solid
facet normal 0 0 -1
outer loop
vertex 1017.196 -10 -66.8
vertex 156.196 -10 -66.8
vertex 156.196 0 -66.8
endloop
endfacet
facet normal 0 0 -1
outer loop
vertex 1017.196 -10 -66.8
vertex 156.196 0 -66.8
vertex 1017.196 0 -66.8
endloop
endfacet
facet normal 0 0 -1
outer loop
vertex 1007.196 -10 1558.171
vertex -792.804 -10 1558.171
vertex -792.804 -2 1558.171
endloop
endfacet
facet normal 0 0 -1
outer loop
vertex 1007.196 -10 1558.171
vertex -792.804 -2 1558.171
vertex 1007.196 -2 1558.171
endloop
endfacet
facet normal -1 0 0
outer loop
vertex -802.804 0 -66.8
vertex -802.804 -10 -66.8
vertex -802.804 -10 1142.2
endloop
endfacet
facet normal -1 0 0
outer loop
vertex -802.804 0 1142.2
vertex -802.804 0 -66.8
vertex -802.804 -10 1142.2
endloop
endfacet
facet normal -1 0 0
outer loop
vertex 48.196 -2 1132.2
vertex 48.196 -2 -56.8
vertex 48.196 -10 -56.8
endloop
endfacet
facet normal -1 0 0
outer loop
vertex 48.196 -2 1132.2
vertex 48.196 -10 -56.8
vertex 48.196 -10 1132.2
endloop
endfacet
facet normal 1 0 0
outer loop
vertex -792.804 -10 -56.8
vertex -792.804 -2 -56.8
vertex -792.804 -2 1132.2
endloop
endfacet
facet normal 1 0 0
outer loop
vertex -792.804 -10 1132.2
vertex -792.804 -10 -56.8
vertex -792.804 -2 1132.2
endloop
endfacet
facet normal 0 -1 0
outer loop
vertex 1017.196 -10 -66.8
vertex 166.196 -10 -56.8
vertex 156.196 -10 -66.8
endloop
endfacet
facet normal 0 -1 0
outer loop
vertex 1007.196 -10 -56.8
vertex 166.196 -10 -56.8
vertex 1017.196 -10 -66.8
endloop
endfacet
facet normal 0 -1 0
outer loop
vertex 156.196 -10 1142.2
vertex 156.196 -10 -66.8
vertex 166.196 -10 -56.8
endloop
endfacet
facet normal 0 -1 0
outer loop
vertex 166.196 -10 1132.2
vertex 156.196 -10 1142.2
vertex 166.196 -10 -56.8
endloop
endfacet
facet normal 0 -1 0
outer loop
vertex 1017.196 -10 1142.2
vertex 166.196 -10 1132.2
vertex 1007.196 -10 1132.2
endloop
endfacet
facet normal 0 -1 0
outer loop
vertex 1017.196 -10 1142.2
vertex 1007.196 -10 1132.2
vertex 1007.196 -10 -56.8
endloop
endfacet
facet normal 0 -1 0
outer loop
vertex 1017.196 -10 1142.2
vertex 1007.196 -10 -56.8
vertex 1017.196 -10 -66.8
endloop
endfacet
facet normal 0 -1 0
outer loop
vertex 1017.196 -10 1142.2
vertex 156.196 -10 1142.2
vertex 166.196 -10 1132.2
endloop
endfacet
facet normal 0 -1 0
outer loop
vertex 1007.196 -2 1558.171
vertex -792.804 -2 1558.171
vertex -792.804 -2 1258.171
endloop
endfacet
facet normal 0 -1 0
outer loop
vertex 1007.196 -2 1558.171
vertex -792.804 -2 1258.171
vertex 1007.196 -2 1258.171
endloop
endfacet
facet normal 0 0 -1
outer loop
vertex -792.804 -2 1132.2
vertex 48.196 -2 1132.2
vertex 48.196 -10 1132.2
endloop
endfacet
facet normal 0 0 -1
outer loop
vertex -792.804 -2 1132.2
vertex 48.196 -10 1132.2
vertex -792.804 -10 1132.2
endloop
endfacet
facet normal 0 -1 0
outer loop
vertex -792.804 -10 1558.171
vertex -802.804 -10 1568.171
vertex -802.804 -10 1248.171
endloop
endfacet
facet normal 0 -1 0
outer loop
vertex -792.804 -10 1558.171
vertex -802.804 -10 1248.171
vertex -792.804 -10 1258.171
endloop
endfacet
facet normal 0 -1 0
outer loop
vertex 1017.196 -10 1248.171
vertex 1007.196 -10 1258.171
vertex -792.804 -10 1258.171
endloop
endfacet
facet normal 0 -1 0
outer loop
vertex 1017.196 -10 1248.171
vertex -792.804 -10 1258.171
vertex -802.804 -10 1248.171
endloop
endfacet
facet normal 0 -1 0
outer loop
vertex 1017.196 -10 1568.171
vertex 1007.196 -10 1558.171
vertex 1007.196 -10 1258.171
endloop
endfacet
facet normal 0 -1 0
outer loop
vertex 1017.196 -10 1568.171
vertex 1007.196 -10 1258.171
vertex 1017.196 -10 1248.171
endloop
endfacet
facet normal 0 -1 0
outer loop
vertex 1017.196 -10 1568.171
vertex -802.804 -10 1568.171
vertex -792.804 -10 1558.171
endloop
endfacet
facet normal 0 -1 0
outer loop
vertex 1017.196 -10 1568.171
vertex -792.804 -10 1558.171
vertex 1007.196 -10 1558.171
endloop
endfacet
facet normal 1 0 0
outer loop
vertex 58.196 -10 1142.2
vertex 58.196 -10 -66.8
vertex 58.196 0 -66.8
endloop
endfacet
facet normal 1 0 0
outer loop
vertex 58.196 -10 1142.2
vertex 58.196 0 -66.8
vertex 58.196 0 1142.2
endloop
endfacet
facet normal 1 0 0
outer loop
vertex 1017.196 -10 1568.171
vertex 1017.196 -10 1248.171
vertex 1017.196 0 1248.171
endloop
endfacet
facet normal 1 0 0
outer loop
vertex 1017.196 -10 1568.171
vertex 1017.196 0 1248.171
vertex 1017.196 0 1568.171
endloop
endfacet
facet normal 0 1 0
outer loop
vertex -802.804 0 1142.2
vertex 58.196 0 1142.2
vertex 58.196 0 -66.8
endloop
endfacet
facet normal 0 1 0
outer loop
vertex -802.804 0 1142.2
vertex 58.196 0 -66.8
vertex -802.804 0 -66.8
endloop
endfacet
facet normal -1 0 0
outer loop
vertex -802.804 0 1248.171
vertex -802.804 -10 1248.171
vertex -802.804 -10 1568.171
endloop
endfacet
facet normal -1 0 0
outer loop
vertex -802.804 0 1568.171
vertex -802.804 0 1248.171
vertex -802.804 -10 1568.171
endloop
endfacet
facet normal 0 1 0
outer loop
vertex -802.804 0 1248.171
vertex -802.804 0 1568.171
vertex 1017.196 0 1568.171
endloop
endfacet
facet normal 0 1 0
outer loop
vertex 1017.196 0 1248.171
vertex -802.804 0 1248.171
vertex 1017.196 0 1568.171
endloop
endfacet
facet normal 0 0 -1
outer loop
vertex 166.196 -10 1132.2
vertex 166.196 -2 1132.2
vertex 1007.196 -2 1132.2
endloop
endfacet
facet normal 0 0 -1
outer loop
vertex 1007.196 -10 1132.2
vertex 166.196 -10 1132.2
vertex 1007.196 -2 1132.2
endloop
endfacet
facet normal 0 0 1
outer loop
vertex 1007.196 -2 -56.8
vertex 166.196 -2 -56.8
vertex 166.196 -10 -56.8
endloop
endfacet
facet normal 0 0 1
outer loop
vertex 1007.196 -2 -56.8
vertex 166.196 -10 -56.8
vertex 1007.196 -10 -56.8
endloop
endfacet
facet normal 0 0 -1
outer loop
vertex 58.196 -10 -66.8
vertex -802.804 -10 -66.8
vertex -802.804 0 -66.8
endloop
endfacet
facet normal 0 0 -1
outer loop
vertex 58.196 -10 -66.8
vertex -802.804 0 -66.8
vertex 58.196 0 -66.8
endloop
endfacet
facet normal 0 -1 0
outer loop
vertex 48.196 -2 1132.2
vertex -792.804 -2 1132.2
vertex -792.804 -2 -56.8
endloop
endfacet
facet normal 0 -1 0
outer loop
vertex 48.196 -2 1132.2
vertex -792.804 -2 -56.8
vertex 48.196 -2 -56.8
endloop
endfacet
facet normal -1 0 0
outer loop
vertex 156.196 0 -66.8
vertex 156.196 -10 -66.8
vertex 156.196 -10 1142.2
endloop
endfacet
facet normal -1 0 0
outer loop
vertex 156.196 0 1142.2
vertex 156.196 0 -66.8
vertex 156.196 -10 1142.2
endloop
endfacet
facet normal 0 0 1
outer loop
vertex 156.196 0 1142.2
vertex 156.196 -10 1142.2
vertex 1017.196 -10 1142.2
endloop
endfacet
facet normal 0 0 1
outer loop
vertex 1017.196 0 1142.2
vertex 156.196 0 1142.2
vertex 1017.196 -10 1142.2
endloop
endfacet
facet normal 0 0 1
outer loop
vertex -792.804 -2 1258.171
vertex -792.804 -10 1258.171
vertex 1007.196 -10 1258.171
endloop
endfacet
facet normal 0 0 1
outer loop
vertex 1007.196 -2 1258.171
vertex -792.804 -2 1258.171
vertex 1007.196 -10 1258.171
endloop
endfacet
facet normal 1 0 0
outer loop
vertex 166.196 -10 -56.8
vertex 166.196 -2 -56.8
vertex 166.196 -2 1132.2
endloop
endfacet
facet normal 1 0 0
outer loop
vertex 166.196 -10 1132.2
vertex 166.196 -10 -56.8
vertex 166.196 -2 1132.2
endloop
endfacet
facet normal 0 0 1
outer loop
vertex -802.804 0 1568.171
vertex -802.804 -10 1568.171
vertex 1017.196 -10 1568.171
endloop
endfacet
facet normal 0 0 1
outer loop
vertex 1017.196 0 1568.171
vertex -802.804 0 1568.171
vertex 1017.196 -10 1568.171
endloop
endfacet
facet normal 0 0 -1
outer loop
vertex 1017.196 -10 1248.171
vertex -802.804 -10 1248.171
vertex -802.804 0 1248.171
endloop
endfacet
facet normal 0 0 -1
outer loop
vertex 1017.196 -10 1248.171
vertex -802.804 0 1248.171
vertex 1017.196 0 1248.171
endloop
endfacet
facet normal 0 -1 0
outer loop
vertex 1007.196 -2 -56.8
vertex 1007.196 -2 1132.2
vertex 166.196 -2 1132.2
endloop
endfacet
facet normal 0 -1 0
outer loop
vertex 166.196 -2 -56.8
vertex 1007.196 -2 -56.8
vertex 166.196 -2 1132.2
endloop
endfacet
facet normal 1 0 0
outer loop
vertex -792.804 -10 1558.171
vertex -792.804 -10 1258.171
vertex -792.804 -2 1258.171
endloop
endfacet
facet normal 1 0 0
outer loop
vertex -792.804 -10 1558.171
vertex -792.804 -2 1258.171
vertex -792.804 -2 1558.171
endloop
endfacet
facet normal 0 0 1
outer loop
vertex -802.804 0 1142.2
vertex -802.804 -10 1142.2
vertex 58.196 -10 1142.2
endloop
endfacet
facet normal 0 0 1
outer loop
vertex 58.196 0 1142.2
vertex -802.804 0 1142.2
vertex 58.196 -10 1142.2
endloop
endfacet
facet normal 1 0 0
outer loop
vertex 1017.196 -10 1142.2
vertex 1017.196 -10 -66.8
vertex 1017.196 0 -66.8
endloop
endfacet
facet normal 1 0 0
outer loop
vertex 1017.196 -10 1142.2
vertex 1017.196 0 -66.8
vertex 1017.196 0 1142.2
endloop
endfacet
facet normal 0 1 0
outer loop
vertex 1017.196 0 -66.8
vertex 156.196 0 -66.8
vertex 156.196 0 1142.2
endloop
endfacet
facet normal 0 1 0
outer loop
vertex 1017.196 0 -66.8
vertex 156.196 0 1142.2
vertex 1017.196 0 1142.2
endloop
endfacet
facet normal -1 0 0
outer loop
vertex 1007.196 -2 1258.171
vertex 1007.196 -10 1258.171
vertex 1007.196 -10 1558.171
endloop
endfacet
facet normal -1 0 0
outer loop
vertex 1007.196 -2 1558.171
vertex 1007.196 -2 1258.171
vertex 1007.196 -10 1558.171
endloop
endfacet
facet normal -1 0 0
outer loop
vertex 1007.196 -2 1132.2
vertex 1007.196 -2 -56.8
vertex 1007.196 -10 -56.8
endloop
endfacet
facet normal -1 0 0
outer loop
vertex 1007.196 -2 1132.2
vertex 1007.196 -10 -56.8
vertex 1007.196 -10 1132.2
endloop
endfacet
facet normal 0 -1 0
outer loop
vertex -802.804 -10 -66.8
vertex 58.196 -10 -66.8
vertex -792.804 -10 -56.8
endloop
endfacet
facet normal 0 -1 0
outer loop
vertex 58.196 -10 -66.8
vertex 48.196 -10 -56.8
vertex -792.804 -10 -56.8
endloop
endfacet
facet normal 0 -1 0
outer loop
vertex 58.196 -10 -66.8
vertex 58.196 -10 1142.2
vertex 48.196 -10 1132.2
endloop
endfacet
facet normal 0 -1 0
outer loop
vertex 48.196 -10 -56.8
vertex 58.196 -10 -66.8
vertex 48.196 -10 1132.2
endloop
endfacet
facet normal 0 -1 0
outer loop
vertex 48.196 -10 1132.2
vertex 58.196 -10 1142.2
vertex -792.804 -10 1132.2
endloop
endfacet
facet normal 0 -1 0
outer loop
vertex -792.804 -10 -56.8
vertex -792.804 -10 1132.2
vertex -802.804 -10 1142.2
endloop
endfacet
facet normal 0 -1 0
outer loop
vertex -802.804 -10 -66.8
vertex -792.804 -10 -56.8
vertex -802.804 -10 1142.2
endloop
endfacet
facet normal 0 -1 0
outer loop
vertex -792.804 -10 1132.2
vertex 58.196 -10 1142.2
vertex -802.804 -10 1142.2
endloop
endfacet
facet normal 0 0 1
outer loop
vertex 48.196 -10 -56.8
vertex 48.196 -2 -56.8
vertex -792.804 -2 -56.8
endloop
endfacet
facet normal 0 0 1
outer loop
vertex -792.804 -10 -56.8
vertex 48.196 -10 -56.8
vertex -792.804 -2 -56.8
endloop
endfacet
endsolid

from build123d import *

# Parameters (mm, degrees)
F0_W      = 841
F0_H      = 1189
F1_DEPTH  = 2
F2_W      = 921
F2_H      = 1269
F2_W_2    = 841
F2_H_2    = 1189
F3_DEPTH  = 10
F6_W      = 1880
F6_H      = 380
F6_W_2    = 1800
F6_H_2    = 300
F7_DEPTH  = 10
F8_W      = 1800
F8_H      = 300
F9_DEPTH  = 2
F10_W     = 1908.451933
F10_H     = 1724.52875
F10_W_2   = 1820
F10_H_2   = 1634.971202
F11_DEPTH = 25
F12_W     = 1820
F12_H     = 105.971202
F13_DEPTH = 25
F14_W     = 98
F14_H     = 1209
F15_DEPTH = 25


with BuildPart() as f1:
    # F0 (on Front) → F1 (new body)
    with BuildSketch(Plane.XZ):
        with Locations((-372.30434, 537.699918)):
            Rectangle(F0_W, F0_H)
    extrude(amount=F1_DEPTH)

    # F2 (on face) → F3 (join)
    with BuildSketch(Plane(origin=(0, 0, 0), x_dir=(-1, 0, 0), z_dir=(0, 1, 0))):
        with Locations((372.30434, 537.699918)):
            Rectangle(F2_W, F2_H)
        with Locations((372.30434, 537.699918)):
            Rectangle(F2_W_2, F2_H_2, mode=Mode.SUBTRACT)
    extrude(amount=-F3_DEPTH)


with BuildPart() as f5_1:
    # F5: instance of F1
    add(f1.part.mirror(Plane(origin=(107.19566, -6, 537.699918), x_dir=(0, 1, 0), z_dir=(1, 0, 0))))


with BuildPart() as f7:
    # F6 (on face) → F7 (new body, through all)
    with BuildSketch(Plane.XZ.offset(10)):
        with Locations((107.19566, 1408.17112)):
            Rectangle(F6_W, F6_H)
        with Locations((107.19566, 1408.17112)):
            Rectangle(F6_W_2, F6_H_2, mode=Mode.SUBTRACT)
    extrude(amount=-F7_DEPTH)

    # F8 (on face) → F9 (join, through all)
    with BuildSketch(Plane.XZ.offset(2)):
        with Locations((107.19566, 1408.17112)):
            Rectangle(F8_W, F8_H)
    extrude(amount=-F9_DEPTH)


with BuildPart() as f11_tool:
    # F10 (on face) → F11 (new body)
    with BuildSketch(Plane.XZ.offset(10)):
        with Locations((121.421627, 735.906745)):
            Rectangle(F10_W, F10_H)
        with Locations((107.19566, 750.685519)):
            Rectangle(F10_W_2, F10_H_2, mode=Mode.SUBTRACT)
    extrude(amount=-F11_DEPTH)


with BuildPart() as f1_1:
    add(f1.part)

    # F11: cut by f11_tool
    add(f11_tool.part, mode=Mode.SUBTRACT)


with BuildPart() as f5_1_1:
    add(f5_1.part)

    # F11: cut by f11_tool
    add(f11_tool.part, mode=Mode.SUBTRACT)


with BuildPart() as f7_1:
    add(f7.part)

    # F11: cut by f11_tool
    add(f11_tool.part, mode=Mode.SUBTRACT)


with BuildPart() as f13_tool:
    # F12 (on face) → F13 (new body)
    with BuildSketch(Plane.XZ.offset(10)):
        with Locations((107.19566, 1195.185519)):
            Rectangle(F12_W, F12_H)
    extrude(amount=-F13_DEPTH)


with BuildPart() as f1_2:
    add(f1_1.part)

    # F13: cut by f13_tool
    add(f13_tool.part, mode=Mode.SUBTRACT)


with BuildPart() as f5_1_2:
    add(f5_1_1.part)

    # F13: cut by f13_tool
    add(f13_tool.part, mode=Mode.SUBTRACT)


with BuildPart() as f7_2:
    add(f7_1.part)

    # F13: cut by f13_tool
    add(f13_tool.part, mode=Mode.SUBTRACT)


with BuildPart() as f15_tool:
    # F14 (on face) → F15 (new body)
    with BuildSketch(Plane.XZ.offset(10)):
        with Locations((107.19566, 537.699918)):
            Rectangle(F14_W, F14_H)
    extrude(amount=-F15_DEPTH)


with BuildPart() as f1_3:
    add(f1_2.part)

    # F15: cut by f15_tool
    add(f15_tool.part, mode=Mode.SUBTRACT)


with BuildPart() as f5_1_3:
    add(f5_1_2.part)

    # F15: cut by f15_tool
    add(f15_tool.part, mode=Mode.SUBTRACT)


solid = Compound([f7_2.part, f1_3.part, f5_1_3.part])
